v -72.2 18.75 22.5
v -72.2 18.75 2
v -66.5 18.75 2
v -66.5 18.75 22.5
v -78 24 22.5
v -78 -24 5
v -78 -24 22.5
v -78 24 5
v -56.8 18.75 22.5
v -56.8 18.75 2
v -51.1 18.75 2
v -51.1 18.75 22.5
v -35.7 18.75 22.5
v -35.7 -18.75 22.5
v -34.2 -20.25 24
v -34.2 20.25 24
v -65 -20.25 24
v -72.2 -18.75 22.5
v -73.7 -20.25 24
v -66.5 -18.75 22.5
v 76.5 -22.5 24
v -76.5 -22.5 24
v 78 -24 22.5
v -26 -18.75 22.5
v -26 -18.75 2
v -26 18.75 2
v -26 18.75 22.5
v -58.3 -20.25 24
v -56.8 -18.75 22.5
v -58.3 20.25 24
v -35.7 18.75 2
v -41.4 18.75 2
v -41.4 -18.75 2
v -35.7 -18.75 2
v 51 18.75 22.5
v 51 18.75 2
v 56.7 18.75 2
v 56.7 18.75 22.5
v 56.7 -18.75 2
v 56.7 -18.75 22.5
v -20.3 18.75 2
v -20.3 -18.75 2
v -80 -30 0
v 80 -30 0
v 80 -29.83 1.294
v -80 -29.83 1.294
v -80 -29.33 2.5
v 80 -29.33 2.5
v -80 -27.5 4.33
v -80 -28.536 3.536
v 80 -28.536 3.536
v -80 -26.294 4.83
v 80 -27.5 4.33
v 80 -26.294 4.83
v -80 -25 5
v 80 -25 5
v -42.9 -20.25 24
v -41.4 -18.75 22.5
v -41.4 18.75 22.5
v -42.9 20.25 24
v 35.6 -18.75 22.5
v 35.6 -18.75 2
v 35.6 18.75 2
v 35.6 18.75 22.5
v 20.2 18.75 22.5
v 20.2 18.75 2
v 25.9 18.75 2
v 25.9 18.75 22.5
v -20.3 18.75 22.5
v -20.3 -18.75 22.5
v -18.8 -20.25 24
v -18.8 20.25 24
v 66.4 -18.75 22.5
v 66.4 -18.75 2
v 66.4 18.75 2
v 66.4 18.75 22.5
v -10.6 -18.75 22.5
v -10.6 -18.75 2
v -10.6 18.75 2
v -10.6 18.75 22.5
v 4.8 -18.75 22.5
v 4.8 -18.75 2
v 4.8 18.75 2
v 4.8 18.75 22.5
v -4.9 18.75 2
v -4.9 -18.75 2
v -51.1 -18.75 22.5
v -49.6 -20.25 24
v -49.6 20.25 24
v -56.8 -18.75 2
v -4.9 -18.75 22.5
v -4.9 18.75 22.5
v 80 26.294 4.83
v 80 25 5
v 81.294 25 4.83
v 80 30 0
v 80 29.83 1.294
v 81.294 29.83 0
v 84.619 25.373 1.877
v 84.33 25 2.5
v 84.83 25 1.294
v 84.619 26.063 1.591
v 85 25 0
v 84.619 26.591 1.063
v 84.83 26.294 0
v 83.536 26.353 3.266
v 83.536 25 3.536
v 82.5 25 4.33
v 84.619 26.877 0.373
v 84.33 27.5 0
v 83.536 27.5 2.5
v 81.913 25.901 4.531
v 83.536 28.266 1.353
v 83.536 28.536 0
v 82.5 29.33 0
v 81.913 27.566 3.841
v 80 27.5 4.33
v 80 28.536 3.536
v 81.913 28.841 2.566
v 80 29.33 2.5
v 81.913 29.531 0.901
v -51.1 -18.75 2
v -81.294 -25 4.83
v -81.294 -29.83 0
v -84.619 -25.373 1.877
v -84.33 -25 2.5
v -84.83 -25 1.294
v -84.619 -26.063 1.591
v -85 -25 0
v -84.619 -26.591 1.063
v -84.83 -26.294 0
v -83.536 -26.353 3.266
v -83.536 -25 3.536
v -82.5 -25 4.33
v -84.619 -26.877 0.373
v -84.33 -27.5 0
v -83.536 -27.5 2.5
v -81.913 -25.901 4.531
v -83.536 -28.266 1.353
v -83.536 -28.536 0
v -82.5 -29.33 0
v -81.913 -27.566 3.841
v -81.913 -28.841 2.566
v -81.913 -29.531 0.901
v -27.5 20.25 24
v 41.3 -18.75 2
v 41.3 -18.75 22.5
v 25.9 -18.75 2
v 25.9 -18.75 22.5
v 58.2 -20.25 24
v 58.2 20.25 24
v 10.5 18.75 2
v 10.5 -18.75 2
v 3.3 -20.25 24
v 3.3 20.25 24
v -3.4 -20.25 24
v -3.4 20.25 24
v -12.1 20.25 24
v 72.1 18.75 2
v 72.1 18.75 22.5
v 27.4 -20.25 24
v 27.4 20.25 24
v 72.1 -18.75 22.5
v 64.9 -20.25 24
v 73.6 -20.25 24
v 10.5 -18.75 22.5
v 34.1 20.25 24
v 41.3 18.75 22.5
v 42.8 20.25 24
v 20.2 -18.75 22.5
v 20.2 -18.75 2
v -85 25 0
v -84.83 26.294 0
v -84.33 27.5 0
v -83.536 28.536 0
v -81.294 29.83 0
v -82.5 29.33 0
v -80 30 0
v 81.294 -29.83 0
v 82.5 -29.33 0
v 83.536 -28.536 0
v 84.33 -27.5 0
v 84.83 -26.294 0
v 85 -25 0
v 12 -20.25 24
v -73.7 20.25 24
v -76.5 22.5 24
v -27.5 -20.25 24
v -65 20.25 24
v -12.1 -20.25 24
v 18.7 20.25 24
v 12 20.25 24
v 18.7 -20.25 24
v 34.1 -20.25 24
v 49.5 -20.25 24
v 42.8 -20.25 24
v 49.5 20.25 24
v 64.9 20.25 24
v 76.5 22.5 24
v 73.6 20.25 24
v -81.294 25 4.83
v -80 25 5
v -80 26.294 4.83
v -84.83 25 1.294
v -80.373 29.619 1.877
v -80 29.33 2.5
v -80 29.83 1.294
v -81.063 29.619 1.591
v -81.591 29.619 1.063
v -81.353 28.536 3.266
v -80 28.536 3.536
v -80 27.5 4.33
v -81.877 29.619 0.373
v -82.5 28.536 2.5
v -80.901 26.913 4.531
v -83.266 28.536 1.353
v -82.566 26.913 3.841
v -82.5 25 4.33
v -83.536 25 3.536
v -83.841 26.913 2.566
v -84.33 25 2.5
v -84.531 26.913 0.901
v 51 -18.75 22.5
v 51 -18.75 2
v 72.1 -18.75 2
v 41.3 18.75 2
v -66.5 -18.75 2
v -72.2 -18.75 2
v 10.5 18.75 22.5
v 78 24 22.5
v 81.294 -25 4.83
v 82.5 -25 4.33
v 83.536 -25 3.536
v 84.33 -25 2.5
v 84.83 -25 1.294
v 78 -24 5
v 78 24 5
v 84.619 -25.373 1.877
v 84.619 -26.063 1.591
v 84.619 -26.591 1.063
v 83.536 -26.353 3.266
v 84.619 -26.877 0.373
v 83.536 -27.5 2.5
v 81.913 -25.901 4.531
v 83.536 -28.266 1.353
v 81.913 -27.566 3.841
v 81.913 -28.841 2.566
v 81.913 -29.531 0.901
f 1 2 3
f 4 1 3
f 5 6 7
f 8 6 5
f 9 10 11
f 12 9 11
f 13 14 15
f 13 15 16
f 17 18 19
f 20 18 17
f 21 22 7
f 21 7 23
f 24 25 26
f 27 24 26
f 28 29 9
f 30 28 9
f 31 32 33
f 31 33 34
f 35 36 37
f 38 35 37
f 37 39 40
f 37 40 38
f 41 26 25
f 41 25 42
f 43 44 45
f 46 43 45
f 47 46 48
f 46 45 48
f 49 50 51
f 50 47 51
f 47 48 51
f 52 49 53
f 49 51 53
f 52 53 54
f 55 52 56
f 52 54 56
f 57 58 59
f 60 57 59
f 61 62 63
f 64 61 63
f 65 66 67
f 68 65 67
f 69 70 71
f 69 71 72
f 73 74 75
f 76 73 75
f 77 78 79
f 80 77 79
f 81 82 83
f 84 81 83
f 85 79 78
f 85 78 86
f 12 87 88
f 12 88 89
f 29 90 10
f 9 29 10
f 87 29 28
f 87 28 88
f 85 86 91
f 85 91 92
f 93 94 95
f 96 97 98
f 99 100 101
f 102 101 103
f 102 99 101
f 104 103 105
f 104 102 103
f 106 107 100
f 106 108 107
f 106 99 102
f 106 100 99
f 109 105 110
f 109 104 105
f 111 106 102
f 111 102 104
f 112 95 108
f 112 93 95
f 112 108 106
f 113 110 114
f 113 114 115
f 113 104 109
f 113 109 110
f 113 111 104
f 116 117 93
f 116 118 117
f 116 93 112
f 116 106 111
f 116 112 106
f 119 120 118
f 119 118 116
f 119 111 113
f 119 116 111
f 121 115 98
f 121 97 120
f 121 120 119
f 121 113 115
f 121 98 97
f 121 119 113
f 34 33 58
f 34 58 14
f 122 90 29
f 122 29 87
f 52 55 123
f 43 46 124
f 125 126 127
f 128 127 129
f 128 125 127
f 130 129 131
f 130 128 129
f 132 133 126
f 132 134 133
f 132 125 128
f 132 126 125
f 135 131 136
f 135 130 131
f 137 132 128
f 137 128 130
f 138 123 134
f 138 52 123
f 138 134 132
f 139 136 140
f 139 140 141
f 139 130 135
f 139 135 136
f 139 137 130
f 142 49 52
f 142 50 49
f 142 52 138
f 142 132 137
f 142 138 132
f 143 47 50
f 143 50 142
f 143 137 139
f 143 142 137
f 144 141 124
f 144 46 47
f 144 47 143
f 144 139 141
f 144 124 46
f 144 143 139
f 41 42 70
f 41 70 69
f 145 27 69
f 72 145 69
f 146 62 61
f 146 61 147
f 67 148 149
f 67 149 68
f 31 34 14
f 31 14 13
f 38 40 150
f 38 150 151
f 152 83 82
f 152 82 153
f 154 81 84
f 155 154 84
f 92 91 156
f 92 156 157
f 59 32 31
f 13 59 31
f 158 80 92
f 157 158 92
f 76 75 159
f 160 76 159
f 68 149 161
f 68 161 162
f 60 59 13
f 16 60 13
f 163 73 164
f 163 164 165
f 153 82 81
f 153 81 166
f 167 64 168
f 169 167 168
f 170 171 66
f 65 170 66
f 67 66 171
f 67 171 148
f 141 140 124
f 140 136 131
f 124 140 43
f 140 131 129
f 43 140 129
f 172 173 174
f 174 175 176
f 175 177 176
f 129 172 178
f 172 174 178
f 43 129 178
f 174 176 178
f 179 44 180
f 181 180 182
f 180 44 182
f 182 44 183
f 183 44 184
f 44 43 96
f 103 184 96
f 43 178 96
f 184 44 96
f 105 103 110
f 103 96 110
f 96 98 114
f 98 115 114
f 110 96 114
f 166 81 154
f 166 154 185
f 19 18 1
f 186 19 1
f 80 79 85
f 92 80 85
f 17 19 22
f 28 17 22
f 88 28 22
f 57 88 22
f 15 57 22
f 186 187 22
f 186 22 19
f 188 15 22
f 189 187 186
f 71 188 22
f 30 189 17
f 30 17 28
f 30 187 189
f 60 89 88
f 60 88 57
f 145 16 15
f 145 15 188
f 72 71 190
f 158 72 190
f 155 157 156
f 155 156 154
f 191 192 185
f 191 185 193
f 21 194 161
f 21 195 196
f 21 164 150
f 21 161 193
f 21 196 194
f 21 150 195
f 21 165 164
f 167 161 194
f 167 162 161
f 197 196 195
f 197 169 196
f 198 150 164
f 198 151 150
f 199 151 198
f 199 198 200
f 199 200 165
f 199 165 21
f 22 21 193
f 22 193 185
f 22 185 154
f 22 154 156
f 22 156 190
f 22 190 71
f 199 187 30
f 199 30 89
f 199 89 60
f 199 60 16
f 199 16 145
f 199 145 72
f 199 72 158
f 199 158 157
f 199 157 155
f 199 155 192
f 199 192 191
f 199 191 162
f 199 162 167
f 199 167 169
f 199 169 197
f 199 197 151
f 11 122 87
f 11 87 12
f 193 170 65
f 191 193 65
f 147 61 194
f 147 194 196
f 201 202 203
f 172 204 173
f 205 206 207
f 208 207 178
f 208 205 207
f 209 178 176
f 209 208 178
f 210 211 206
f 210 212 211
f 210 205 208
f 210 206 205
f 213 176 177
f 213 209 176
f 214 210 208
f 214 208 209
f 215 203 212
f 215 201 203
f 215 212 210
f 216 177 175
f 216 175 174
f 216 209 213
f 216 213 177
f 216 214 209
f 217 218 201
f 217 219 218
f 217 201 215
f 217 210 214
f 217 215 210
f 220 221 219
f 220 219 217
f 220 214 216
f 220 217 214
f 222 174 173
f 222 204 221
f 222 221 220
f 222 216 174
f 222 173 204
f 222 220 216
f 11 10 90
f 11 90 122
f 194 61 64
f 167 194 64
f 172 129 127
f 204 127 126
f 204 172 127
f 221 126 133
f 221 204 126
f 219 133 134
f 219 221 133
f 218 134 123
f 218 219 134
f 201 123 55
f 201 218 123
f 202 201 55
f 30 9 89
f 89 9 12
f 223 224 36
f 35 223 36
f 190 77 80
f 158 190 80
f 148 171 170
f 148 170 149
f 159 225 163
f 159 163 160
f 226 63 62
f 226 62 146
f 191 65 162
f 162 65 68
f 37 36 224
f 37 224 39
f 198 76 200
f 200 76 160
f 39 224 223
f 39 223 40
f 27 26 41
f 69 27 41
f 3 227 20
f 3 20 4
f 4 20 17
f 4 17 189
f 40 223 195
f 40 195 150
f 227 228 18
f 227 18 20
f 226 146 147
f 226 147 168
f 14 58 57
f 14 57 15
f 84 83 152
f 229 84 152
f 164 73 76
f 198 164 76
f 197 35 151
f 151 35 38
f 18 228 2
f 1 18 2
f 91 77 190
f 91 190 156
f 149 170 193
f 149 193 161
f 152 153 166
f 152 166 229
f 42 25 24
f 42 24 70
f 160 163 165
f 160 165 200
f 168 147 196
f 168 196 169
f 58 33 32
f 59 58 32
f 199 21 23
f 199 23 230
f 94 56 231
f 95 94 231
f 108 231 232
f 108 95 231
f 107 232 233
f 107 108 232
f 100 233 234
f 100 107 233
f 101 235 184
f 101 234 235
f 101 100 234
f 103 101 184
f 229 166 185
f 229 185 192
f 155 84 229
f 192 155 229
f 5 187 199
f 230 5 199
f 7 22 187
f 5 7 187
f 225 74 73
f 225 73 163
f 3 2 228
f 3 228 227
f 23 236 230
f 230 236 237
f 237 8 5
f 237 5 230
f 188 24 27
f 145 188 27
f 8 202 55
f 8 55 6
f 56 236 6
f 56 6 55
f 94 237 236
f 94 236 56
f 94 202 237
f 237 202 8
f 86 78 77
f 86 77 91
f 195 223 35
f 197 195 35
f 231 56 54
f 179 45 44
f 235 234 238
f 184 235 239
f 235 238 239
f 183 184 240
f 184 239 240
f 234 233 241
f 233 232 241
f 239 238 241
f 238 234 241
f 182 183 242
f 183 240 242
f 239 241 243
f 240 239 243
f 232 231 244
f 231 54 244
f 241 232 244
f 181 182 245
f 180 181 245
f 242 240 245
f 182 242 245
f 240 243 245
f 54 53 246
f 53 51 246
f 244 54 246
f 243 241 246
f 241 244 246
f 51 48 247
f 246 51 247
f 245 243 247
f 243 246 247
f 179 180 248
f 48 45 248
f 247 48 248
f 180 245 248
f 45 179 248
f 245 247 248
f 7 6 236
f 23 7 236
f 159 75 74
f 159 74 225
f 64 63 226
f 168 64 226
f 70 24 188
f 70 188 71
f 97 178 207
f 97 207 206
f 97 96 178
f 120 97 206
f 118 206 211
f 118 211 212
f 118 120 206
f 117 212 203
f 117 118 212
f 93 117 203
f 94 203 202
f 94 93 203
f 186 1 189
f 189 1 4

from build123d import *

# Parameters (mm, degrees)
F0_W     = 156
F0_H     = 48
F1_DEPTH = 2
F2_W     = 156
F2_H     = 48
F2_W_2   = 5.7
F2_H_2   = 37.5
F3_DEPTH = 22
F0_W_2   = 170
F0_H_2   = 60
F4_DEPTH = 5
F5_R     = 4.99999
F6_SIZE  = 1.5


# Not quite as in the source:
# - a fillet or chamfer is up to 0.001 mm smaller than in the source, because OpenCascade refuses the exact size


with BuildPart() as f1:
    # F0 (on Top) → F1 (new body)
    with BuildSketch(Plane.XY):
        Rectangle(F0_W, F0_H)
    extrude(amount=F1_DEPTH)

    # F2 (on face) → F3 (join)
    with BuildSketch(Plane.XY.offset(2)):
        Rectangle(F2_W, F2_H)
        with Locations((-69.35, 0)):
            Rectangle(F2_W_2, F2_H_2, mode=Mode.SUBTRACT)
        with Locations((-53.95, 0)):
            Rectangle(F2_W_2, F2_H_2, mode=Mode.SUBTRACT)
        with Locations((-38.55, 0)):
            Rectangle(F2_W_2, F2_H_2, mode=Mode.SUBTRACT)
        with Locations((-23.15, 0)):
            Rectangle(F2_W_2, F2_H_2, mode=Mode.SUBTRACT)
        with Locations((-7.75, 0)):
            Rectangle(F2_W_2, F2_H_2, mode=Mode.SUBTRACT)
        with Locations((7.65, 0)):
            Rectangle(F2_W_2, F2_H_2, mode=Mode.SUBTRACT)
        with Locations((23.05, 0)):
            Rectangle(F2_W_2, F2_H_2, mode=Mode.SUBTRACT)
        with Locations((38.45, 0)):
            Rectangle(F2_W_2, F2_H_2, mode=Mode.SUBTRACT)
        with Locations((53.85, 0)):
            Rectangle(F2_W_2, F2_H_2, mode=Mode.SUBTRACT)
        with Locations((69.25, 0)):
            Rectangle(F2_W_2, F2_H_2, mode=Mode.SUBTRACT)
    extrude(amount=F3_DEPTH)

    # F0 (on Top) → F4 (join)
    with BuildSketch(Plane.XY):
        Rectangle(F0_W_2, F0_H_2)
        Rectangle(F0_W, F0_H, mode=Mode.SUBTRACT)
    extrude(amount=F4_DEPTH)

    # F5 (radius 5 in the source; OpenCascade refuses exactly that, so slightly less here)
    f5_edges = [f1.edges().sort_by_distance(p)[0] for p in [
        (0, -30, 5),
        (-85, 0, 5),
        (0, 30, 5),
        (85, 0, 5),
        (85, -30, 2.5),
        (85, 30, 2.5),
        (-85, -30, 2.5),
        (-85, 30, 2.5),
    ]]
    fillet(f5_edges, radius=F5_R)

    # F6
    f6_edges = [f1.edges().sort_by_distance(p)[0] for p in [
        (0, -24, 24),
        (-78, 0, 24),
        (0, 24, 24),
        (78, 0, 24),
        (-72.2, 0, 24),
        (-66.5, 0, 24),
        (-69.35, -18.75, 24),
        (-69.35, 18.75, 24),
        (-53.95, -18.75, 24),
        (-51.1, 0, 24),
        (-56.8, 0, 24),
        (-53.95, 18.75, 24),
        (-38.55, 18.75, 24),
        (-41.4, 0, 24),
        (-38.55, -18.75, 24),
        (-35.7, 0, 24),
        (-26, 0, 24),
        (-20.3, 0, 24),
        (-23.15, -18.75, 24),
        (-23.15, 18.75, 24),
        (-10.6, 0, 24),
        (-7.75, 18.75, 24),
        (-4.9, 0, 24),
        (-7.75, -18.75, 24),
        (7.65, -18.75, 24),
        (4.8, 0, 24),
        (10.5, 0, 24),
        (7.65, 18.75, 24),
        (20.2, 0, 24),
        (23.05, 18.75, 24),
        (25.9, 0, 24),
        (23.05, -18.75, 24),
        (38.45, -18.75, 24),
        (35.6, 0, 24),
        (41.3, 0, 24),
        (38.45, 18.75, 24),
        (51, 0, 24),
        (53.85, -18.75, 24),
        (56.7, 0, 24),
        (53.85, 18.75, 24),
        (66.4, 0, 24),
        (69.25, -18.75, 24),
        (72.1, 0, 24),
        (69.25, 18.75, 24),
    ]]
    chamfer(f6_edges, length=F6_SIZE)


solid = f1.part
